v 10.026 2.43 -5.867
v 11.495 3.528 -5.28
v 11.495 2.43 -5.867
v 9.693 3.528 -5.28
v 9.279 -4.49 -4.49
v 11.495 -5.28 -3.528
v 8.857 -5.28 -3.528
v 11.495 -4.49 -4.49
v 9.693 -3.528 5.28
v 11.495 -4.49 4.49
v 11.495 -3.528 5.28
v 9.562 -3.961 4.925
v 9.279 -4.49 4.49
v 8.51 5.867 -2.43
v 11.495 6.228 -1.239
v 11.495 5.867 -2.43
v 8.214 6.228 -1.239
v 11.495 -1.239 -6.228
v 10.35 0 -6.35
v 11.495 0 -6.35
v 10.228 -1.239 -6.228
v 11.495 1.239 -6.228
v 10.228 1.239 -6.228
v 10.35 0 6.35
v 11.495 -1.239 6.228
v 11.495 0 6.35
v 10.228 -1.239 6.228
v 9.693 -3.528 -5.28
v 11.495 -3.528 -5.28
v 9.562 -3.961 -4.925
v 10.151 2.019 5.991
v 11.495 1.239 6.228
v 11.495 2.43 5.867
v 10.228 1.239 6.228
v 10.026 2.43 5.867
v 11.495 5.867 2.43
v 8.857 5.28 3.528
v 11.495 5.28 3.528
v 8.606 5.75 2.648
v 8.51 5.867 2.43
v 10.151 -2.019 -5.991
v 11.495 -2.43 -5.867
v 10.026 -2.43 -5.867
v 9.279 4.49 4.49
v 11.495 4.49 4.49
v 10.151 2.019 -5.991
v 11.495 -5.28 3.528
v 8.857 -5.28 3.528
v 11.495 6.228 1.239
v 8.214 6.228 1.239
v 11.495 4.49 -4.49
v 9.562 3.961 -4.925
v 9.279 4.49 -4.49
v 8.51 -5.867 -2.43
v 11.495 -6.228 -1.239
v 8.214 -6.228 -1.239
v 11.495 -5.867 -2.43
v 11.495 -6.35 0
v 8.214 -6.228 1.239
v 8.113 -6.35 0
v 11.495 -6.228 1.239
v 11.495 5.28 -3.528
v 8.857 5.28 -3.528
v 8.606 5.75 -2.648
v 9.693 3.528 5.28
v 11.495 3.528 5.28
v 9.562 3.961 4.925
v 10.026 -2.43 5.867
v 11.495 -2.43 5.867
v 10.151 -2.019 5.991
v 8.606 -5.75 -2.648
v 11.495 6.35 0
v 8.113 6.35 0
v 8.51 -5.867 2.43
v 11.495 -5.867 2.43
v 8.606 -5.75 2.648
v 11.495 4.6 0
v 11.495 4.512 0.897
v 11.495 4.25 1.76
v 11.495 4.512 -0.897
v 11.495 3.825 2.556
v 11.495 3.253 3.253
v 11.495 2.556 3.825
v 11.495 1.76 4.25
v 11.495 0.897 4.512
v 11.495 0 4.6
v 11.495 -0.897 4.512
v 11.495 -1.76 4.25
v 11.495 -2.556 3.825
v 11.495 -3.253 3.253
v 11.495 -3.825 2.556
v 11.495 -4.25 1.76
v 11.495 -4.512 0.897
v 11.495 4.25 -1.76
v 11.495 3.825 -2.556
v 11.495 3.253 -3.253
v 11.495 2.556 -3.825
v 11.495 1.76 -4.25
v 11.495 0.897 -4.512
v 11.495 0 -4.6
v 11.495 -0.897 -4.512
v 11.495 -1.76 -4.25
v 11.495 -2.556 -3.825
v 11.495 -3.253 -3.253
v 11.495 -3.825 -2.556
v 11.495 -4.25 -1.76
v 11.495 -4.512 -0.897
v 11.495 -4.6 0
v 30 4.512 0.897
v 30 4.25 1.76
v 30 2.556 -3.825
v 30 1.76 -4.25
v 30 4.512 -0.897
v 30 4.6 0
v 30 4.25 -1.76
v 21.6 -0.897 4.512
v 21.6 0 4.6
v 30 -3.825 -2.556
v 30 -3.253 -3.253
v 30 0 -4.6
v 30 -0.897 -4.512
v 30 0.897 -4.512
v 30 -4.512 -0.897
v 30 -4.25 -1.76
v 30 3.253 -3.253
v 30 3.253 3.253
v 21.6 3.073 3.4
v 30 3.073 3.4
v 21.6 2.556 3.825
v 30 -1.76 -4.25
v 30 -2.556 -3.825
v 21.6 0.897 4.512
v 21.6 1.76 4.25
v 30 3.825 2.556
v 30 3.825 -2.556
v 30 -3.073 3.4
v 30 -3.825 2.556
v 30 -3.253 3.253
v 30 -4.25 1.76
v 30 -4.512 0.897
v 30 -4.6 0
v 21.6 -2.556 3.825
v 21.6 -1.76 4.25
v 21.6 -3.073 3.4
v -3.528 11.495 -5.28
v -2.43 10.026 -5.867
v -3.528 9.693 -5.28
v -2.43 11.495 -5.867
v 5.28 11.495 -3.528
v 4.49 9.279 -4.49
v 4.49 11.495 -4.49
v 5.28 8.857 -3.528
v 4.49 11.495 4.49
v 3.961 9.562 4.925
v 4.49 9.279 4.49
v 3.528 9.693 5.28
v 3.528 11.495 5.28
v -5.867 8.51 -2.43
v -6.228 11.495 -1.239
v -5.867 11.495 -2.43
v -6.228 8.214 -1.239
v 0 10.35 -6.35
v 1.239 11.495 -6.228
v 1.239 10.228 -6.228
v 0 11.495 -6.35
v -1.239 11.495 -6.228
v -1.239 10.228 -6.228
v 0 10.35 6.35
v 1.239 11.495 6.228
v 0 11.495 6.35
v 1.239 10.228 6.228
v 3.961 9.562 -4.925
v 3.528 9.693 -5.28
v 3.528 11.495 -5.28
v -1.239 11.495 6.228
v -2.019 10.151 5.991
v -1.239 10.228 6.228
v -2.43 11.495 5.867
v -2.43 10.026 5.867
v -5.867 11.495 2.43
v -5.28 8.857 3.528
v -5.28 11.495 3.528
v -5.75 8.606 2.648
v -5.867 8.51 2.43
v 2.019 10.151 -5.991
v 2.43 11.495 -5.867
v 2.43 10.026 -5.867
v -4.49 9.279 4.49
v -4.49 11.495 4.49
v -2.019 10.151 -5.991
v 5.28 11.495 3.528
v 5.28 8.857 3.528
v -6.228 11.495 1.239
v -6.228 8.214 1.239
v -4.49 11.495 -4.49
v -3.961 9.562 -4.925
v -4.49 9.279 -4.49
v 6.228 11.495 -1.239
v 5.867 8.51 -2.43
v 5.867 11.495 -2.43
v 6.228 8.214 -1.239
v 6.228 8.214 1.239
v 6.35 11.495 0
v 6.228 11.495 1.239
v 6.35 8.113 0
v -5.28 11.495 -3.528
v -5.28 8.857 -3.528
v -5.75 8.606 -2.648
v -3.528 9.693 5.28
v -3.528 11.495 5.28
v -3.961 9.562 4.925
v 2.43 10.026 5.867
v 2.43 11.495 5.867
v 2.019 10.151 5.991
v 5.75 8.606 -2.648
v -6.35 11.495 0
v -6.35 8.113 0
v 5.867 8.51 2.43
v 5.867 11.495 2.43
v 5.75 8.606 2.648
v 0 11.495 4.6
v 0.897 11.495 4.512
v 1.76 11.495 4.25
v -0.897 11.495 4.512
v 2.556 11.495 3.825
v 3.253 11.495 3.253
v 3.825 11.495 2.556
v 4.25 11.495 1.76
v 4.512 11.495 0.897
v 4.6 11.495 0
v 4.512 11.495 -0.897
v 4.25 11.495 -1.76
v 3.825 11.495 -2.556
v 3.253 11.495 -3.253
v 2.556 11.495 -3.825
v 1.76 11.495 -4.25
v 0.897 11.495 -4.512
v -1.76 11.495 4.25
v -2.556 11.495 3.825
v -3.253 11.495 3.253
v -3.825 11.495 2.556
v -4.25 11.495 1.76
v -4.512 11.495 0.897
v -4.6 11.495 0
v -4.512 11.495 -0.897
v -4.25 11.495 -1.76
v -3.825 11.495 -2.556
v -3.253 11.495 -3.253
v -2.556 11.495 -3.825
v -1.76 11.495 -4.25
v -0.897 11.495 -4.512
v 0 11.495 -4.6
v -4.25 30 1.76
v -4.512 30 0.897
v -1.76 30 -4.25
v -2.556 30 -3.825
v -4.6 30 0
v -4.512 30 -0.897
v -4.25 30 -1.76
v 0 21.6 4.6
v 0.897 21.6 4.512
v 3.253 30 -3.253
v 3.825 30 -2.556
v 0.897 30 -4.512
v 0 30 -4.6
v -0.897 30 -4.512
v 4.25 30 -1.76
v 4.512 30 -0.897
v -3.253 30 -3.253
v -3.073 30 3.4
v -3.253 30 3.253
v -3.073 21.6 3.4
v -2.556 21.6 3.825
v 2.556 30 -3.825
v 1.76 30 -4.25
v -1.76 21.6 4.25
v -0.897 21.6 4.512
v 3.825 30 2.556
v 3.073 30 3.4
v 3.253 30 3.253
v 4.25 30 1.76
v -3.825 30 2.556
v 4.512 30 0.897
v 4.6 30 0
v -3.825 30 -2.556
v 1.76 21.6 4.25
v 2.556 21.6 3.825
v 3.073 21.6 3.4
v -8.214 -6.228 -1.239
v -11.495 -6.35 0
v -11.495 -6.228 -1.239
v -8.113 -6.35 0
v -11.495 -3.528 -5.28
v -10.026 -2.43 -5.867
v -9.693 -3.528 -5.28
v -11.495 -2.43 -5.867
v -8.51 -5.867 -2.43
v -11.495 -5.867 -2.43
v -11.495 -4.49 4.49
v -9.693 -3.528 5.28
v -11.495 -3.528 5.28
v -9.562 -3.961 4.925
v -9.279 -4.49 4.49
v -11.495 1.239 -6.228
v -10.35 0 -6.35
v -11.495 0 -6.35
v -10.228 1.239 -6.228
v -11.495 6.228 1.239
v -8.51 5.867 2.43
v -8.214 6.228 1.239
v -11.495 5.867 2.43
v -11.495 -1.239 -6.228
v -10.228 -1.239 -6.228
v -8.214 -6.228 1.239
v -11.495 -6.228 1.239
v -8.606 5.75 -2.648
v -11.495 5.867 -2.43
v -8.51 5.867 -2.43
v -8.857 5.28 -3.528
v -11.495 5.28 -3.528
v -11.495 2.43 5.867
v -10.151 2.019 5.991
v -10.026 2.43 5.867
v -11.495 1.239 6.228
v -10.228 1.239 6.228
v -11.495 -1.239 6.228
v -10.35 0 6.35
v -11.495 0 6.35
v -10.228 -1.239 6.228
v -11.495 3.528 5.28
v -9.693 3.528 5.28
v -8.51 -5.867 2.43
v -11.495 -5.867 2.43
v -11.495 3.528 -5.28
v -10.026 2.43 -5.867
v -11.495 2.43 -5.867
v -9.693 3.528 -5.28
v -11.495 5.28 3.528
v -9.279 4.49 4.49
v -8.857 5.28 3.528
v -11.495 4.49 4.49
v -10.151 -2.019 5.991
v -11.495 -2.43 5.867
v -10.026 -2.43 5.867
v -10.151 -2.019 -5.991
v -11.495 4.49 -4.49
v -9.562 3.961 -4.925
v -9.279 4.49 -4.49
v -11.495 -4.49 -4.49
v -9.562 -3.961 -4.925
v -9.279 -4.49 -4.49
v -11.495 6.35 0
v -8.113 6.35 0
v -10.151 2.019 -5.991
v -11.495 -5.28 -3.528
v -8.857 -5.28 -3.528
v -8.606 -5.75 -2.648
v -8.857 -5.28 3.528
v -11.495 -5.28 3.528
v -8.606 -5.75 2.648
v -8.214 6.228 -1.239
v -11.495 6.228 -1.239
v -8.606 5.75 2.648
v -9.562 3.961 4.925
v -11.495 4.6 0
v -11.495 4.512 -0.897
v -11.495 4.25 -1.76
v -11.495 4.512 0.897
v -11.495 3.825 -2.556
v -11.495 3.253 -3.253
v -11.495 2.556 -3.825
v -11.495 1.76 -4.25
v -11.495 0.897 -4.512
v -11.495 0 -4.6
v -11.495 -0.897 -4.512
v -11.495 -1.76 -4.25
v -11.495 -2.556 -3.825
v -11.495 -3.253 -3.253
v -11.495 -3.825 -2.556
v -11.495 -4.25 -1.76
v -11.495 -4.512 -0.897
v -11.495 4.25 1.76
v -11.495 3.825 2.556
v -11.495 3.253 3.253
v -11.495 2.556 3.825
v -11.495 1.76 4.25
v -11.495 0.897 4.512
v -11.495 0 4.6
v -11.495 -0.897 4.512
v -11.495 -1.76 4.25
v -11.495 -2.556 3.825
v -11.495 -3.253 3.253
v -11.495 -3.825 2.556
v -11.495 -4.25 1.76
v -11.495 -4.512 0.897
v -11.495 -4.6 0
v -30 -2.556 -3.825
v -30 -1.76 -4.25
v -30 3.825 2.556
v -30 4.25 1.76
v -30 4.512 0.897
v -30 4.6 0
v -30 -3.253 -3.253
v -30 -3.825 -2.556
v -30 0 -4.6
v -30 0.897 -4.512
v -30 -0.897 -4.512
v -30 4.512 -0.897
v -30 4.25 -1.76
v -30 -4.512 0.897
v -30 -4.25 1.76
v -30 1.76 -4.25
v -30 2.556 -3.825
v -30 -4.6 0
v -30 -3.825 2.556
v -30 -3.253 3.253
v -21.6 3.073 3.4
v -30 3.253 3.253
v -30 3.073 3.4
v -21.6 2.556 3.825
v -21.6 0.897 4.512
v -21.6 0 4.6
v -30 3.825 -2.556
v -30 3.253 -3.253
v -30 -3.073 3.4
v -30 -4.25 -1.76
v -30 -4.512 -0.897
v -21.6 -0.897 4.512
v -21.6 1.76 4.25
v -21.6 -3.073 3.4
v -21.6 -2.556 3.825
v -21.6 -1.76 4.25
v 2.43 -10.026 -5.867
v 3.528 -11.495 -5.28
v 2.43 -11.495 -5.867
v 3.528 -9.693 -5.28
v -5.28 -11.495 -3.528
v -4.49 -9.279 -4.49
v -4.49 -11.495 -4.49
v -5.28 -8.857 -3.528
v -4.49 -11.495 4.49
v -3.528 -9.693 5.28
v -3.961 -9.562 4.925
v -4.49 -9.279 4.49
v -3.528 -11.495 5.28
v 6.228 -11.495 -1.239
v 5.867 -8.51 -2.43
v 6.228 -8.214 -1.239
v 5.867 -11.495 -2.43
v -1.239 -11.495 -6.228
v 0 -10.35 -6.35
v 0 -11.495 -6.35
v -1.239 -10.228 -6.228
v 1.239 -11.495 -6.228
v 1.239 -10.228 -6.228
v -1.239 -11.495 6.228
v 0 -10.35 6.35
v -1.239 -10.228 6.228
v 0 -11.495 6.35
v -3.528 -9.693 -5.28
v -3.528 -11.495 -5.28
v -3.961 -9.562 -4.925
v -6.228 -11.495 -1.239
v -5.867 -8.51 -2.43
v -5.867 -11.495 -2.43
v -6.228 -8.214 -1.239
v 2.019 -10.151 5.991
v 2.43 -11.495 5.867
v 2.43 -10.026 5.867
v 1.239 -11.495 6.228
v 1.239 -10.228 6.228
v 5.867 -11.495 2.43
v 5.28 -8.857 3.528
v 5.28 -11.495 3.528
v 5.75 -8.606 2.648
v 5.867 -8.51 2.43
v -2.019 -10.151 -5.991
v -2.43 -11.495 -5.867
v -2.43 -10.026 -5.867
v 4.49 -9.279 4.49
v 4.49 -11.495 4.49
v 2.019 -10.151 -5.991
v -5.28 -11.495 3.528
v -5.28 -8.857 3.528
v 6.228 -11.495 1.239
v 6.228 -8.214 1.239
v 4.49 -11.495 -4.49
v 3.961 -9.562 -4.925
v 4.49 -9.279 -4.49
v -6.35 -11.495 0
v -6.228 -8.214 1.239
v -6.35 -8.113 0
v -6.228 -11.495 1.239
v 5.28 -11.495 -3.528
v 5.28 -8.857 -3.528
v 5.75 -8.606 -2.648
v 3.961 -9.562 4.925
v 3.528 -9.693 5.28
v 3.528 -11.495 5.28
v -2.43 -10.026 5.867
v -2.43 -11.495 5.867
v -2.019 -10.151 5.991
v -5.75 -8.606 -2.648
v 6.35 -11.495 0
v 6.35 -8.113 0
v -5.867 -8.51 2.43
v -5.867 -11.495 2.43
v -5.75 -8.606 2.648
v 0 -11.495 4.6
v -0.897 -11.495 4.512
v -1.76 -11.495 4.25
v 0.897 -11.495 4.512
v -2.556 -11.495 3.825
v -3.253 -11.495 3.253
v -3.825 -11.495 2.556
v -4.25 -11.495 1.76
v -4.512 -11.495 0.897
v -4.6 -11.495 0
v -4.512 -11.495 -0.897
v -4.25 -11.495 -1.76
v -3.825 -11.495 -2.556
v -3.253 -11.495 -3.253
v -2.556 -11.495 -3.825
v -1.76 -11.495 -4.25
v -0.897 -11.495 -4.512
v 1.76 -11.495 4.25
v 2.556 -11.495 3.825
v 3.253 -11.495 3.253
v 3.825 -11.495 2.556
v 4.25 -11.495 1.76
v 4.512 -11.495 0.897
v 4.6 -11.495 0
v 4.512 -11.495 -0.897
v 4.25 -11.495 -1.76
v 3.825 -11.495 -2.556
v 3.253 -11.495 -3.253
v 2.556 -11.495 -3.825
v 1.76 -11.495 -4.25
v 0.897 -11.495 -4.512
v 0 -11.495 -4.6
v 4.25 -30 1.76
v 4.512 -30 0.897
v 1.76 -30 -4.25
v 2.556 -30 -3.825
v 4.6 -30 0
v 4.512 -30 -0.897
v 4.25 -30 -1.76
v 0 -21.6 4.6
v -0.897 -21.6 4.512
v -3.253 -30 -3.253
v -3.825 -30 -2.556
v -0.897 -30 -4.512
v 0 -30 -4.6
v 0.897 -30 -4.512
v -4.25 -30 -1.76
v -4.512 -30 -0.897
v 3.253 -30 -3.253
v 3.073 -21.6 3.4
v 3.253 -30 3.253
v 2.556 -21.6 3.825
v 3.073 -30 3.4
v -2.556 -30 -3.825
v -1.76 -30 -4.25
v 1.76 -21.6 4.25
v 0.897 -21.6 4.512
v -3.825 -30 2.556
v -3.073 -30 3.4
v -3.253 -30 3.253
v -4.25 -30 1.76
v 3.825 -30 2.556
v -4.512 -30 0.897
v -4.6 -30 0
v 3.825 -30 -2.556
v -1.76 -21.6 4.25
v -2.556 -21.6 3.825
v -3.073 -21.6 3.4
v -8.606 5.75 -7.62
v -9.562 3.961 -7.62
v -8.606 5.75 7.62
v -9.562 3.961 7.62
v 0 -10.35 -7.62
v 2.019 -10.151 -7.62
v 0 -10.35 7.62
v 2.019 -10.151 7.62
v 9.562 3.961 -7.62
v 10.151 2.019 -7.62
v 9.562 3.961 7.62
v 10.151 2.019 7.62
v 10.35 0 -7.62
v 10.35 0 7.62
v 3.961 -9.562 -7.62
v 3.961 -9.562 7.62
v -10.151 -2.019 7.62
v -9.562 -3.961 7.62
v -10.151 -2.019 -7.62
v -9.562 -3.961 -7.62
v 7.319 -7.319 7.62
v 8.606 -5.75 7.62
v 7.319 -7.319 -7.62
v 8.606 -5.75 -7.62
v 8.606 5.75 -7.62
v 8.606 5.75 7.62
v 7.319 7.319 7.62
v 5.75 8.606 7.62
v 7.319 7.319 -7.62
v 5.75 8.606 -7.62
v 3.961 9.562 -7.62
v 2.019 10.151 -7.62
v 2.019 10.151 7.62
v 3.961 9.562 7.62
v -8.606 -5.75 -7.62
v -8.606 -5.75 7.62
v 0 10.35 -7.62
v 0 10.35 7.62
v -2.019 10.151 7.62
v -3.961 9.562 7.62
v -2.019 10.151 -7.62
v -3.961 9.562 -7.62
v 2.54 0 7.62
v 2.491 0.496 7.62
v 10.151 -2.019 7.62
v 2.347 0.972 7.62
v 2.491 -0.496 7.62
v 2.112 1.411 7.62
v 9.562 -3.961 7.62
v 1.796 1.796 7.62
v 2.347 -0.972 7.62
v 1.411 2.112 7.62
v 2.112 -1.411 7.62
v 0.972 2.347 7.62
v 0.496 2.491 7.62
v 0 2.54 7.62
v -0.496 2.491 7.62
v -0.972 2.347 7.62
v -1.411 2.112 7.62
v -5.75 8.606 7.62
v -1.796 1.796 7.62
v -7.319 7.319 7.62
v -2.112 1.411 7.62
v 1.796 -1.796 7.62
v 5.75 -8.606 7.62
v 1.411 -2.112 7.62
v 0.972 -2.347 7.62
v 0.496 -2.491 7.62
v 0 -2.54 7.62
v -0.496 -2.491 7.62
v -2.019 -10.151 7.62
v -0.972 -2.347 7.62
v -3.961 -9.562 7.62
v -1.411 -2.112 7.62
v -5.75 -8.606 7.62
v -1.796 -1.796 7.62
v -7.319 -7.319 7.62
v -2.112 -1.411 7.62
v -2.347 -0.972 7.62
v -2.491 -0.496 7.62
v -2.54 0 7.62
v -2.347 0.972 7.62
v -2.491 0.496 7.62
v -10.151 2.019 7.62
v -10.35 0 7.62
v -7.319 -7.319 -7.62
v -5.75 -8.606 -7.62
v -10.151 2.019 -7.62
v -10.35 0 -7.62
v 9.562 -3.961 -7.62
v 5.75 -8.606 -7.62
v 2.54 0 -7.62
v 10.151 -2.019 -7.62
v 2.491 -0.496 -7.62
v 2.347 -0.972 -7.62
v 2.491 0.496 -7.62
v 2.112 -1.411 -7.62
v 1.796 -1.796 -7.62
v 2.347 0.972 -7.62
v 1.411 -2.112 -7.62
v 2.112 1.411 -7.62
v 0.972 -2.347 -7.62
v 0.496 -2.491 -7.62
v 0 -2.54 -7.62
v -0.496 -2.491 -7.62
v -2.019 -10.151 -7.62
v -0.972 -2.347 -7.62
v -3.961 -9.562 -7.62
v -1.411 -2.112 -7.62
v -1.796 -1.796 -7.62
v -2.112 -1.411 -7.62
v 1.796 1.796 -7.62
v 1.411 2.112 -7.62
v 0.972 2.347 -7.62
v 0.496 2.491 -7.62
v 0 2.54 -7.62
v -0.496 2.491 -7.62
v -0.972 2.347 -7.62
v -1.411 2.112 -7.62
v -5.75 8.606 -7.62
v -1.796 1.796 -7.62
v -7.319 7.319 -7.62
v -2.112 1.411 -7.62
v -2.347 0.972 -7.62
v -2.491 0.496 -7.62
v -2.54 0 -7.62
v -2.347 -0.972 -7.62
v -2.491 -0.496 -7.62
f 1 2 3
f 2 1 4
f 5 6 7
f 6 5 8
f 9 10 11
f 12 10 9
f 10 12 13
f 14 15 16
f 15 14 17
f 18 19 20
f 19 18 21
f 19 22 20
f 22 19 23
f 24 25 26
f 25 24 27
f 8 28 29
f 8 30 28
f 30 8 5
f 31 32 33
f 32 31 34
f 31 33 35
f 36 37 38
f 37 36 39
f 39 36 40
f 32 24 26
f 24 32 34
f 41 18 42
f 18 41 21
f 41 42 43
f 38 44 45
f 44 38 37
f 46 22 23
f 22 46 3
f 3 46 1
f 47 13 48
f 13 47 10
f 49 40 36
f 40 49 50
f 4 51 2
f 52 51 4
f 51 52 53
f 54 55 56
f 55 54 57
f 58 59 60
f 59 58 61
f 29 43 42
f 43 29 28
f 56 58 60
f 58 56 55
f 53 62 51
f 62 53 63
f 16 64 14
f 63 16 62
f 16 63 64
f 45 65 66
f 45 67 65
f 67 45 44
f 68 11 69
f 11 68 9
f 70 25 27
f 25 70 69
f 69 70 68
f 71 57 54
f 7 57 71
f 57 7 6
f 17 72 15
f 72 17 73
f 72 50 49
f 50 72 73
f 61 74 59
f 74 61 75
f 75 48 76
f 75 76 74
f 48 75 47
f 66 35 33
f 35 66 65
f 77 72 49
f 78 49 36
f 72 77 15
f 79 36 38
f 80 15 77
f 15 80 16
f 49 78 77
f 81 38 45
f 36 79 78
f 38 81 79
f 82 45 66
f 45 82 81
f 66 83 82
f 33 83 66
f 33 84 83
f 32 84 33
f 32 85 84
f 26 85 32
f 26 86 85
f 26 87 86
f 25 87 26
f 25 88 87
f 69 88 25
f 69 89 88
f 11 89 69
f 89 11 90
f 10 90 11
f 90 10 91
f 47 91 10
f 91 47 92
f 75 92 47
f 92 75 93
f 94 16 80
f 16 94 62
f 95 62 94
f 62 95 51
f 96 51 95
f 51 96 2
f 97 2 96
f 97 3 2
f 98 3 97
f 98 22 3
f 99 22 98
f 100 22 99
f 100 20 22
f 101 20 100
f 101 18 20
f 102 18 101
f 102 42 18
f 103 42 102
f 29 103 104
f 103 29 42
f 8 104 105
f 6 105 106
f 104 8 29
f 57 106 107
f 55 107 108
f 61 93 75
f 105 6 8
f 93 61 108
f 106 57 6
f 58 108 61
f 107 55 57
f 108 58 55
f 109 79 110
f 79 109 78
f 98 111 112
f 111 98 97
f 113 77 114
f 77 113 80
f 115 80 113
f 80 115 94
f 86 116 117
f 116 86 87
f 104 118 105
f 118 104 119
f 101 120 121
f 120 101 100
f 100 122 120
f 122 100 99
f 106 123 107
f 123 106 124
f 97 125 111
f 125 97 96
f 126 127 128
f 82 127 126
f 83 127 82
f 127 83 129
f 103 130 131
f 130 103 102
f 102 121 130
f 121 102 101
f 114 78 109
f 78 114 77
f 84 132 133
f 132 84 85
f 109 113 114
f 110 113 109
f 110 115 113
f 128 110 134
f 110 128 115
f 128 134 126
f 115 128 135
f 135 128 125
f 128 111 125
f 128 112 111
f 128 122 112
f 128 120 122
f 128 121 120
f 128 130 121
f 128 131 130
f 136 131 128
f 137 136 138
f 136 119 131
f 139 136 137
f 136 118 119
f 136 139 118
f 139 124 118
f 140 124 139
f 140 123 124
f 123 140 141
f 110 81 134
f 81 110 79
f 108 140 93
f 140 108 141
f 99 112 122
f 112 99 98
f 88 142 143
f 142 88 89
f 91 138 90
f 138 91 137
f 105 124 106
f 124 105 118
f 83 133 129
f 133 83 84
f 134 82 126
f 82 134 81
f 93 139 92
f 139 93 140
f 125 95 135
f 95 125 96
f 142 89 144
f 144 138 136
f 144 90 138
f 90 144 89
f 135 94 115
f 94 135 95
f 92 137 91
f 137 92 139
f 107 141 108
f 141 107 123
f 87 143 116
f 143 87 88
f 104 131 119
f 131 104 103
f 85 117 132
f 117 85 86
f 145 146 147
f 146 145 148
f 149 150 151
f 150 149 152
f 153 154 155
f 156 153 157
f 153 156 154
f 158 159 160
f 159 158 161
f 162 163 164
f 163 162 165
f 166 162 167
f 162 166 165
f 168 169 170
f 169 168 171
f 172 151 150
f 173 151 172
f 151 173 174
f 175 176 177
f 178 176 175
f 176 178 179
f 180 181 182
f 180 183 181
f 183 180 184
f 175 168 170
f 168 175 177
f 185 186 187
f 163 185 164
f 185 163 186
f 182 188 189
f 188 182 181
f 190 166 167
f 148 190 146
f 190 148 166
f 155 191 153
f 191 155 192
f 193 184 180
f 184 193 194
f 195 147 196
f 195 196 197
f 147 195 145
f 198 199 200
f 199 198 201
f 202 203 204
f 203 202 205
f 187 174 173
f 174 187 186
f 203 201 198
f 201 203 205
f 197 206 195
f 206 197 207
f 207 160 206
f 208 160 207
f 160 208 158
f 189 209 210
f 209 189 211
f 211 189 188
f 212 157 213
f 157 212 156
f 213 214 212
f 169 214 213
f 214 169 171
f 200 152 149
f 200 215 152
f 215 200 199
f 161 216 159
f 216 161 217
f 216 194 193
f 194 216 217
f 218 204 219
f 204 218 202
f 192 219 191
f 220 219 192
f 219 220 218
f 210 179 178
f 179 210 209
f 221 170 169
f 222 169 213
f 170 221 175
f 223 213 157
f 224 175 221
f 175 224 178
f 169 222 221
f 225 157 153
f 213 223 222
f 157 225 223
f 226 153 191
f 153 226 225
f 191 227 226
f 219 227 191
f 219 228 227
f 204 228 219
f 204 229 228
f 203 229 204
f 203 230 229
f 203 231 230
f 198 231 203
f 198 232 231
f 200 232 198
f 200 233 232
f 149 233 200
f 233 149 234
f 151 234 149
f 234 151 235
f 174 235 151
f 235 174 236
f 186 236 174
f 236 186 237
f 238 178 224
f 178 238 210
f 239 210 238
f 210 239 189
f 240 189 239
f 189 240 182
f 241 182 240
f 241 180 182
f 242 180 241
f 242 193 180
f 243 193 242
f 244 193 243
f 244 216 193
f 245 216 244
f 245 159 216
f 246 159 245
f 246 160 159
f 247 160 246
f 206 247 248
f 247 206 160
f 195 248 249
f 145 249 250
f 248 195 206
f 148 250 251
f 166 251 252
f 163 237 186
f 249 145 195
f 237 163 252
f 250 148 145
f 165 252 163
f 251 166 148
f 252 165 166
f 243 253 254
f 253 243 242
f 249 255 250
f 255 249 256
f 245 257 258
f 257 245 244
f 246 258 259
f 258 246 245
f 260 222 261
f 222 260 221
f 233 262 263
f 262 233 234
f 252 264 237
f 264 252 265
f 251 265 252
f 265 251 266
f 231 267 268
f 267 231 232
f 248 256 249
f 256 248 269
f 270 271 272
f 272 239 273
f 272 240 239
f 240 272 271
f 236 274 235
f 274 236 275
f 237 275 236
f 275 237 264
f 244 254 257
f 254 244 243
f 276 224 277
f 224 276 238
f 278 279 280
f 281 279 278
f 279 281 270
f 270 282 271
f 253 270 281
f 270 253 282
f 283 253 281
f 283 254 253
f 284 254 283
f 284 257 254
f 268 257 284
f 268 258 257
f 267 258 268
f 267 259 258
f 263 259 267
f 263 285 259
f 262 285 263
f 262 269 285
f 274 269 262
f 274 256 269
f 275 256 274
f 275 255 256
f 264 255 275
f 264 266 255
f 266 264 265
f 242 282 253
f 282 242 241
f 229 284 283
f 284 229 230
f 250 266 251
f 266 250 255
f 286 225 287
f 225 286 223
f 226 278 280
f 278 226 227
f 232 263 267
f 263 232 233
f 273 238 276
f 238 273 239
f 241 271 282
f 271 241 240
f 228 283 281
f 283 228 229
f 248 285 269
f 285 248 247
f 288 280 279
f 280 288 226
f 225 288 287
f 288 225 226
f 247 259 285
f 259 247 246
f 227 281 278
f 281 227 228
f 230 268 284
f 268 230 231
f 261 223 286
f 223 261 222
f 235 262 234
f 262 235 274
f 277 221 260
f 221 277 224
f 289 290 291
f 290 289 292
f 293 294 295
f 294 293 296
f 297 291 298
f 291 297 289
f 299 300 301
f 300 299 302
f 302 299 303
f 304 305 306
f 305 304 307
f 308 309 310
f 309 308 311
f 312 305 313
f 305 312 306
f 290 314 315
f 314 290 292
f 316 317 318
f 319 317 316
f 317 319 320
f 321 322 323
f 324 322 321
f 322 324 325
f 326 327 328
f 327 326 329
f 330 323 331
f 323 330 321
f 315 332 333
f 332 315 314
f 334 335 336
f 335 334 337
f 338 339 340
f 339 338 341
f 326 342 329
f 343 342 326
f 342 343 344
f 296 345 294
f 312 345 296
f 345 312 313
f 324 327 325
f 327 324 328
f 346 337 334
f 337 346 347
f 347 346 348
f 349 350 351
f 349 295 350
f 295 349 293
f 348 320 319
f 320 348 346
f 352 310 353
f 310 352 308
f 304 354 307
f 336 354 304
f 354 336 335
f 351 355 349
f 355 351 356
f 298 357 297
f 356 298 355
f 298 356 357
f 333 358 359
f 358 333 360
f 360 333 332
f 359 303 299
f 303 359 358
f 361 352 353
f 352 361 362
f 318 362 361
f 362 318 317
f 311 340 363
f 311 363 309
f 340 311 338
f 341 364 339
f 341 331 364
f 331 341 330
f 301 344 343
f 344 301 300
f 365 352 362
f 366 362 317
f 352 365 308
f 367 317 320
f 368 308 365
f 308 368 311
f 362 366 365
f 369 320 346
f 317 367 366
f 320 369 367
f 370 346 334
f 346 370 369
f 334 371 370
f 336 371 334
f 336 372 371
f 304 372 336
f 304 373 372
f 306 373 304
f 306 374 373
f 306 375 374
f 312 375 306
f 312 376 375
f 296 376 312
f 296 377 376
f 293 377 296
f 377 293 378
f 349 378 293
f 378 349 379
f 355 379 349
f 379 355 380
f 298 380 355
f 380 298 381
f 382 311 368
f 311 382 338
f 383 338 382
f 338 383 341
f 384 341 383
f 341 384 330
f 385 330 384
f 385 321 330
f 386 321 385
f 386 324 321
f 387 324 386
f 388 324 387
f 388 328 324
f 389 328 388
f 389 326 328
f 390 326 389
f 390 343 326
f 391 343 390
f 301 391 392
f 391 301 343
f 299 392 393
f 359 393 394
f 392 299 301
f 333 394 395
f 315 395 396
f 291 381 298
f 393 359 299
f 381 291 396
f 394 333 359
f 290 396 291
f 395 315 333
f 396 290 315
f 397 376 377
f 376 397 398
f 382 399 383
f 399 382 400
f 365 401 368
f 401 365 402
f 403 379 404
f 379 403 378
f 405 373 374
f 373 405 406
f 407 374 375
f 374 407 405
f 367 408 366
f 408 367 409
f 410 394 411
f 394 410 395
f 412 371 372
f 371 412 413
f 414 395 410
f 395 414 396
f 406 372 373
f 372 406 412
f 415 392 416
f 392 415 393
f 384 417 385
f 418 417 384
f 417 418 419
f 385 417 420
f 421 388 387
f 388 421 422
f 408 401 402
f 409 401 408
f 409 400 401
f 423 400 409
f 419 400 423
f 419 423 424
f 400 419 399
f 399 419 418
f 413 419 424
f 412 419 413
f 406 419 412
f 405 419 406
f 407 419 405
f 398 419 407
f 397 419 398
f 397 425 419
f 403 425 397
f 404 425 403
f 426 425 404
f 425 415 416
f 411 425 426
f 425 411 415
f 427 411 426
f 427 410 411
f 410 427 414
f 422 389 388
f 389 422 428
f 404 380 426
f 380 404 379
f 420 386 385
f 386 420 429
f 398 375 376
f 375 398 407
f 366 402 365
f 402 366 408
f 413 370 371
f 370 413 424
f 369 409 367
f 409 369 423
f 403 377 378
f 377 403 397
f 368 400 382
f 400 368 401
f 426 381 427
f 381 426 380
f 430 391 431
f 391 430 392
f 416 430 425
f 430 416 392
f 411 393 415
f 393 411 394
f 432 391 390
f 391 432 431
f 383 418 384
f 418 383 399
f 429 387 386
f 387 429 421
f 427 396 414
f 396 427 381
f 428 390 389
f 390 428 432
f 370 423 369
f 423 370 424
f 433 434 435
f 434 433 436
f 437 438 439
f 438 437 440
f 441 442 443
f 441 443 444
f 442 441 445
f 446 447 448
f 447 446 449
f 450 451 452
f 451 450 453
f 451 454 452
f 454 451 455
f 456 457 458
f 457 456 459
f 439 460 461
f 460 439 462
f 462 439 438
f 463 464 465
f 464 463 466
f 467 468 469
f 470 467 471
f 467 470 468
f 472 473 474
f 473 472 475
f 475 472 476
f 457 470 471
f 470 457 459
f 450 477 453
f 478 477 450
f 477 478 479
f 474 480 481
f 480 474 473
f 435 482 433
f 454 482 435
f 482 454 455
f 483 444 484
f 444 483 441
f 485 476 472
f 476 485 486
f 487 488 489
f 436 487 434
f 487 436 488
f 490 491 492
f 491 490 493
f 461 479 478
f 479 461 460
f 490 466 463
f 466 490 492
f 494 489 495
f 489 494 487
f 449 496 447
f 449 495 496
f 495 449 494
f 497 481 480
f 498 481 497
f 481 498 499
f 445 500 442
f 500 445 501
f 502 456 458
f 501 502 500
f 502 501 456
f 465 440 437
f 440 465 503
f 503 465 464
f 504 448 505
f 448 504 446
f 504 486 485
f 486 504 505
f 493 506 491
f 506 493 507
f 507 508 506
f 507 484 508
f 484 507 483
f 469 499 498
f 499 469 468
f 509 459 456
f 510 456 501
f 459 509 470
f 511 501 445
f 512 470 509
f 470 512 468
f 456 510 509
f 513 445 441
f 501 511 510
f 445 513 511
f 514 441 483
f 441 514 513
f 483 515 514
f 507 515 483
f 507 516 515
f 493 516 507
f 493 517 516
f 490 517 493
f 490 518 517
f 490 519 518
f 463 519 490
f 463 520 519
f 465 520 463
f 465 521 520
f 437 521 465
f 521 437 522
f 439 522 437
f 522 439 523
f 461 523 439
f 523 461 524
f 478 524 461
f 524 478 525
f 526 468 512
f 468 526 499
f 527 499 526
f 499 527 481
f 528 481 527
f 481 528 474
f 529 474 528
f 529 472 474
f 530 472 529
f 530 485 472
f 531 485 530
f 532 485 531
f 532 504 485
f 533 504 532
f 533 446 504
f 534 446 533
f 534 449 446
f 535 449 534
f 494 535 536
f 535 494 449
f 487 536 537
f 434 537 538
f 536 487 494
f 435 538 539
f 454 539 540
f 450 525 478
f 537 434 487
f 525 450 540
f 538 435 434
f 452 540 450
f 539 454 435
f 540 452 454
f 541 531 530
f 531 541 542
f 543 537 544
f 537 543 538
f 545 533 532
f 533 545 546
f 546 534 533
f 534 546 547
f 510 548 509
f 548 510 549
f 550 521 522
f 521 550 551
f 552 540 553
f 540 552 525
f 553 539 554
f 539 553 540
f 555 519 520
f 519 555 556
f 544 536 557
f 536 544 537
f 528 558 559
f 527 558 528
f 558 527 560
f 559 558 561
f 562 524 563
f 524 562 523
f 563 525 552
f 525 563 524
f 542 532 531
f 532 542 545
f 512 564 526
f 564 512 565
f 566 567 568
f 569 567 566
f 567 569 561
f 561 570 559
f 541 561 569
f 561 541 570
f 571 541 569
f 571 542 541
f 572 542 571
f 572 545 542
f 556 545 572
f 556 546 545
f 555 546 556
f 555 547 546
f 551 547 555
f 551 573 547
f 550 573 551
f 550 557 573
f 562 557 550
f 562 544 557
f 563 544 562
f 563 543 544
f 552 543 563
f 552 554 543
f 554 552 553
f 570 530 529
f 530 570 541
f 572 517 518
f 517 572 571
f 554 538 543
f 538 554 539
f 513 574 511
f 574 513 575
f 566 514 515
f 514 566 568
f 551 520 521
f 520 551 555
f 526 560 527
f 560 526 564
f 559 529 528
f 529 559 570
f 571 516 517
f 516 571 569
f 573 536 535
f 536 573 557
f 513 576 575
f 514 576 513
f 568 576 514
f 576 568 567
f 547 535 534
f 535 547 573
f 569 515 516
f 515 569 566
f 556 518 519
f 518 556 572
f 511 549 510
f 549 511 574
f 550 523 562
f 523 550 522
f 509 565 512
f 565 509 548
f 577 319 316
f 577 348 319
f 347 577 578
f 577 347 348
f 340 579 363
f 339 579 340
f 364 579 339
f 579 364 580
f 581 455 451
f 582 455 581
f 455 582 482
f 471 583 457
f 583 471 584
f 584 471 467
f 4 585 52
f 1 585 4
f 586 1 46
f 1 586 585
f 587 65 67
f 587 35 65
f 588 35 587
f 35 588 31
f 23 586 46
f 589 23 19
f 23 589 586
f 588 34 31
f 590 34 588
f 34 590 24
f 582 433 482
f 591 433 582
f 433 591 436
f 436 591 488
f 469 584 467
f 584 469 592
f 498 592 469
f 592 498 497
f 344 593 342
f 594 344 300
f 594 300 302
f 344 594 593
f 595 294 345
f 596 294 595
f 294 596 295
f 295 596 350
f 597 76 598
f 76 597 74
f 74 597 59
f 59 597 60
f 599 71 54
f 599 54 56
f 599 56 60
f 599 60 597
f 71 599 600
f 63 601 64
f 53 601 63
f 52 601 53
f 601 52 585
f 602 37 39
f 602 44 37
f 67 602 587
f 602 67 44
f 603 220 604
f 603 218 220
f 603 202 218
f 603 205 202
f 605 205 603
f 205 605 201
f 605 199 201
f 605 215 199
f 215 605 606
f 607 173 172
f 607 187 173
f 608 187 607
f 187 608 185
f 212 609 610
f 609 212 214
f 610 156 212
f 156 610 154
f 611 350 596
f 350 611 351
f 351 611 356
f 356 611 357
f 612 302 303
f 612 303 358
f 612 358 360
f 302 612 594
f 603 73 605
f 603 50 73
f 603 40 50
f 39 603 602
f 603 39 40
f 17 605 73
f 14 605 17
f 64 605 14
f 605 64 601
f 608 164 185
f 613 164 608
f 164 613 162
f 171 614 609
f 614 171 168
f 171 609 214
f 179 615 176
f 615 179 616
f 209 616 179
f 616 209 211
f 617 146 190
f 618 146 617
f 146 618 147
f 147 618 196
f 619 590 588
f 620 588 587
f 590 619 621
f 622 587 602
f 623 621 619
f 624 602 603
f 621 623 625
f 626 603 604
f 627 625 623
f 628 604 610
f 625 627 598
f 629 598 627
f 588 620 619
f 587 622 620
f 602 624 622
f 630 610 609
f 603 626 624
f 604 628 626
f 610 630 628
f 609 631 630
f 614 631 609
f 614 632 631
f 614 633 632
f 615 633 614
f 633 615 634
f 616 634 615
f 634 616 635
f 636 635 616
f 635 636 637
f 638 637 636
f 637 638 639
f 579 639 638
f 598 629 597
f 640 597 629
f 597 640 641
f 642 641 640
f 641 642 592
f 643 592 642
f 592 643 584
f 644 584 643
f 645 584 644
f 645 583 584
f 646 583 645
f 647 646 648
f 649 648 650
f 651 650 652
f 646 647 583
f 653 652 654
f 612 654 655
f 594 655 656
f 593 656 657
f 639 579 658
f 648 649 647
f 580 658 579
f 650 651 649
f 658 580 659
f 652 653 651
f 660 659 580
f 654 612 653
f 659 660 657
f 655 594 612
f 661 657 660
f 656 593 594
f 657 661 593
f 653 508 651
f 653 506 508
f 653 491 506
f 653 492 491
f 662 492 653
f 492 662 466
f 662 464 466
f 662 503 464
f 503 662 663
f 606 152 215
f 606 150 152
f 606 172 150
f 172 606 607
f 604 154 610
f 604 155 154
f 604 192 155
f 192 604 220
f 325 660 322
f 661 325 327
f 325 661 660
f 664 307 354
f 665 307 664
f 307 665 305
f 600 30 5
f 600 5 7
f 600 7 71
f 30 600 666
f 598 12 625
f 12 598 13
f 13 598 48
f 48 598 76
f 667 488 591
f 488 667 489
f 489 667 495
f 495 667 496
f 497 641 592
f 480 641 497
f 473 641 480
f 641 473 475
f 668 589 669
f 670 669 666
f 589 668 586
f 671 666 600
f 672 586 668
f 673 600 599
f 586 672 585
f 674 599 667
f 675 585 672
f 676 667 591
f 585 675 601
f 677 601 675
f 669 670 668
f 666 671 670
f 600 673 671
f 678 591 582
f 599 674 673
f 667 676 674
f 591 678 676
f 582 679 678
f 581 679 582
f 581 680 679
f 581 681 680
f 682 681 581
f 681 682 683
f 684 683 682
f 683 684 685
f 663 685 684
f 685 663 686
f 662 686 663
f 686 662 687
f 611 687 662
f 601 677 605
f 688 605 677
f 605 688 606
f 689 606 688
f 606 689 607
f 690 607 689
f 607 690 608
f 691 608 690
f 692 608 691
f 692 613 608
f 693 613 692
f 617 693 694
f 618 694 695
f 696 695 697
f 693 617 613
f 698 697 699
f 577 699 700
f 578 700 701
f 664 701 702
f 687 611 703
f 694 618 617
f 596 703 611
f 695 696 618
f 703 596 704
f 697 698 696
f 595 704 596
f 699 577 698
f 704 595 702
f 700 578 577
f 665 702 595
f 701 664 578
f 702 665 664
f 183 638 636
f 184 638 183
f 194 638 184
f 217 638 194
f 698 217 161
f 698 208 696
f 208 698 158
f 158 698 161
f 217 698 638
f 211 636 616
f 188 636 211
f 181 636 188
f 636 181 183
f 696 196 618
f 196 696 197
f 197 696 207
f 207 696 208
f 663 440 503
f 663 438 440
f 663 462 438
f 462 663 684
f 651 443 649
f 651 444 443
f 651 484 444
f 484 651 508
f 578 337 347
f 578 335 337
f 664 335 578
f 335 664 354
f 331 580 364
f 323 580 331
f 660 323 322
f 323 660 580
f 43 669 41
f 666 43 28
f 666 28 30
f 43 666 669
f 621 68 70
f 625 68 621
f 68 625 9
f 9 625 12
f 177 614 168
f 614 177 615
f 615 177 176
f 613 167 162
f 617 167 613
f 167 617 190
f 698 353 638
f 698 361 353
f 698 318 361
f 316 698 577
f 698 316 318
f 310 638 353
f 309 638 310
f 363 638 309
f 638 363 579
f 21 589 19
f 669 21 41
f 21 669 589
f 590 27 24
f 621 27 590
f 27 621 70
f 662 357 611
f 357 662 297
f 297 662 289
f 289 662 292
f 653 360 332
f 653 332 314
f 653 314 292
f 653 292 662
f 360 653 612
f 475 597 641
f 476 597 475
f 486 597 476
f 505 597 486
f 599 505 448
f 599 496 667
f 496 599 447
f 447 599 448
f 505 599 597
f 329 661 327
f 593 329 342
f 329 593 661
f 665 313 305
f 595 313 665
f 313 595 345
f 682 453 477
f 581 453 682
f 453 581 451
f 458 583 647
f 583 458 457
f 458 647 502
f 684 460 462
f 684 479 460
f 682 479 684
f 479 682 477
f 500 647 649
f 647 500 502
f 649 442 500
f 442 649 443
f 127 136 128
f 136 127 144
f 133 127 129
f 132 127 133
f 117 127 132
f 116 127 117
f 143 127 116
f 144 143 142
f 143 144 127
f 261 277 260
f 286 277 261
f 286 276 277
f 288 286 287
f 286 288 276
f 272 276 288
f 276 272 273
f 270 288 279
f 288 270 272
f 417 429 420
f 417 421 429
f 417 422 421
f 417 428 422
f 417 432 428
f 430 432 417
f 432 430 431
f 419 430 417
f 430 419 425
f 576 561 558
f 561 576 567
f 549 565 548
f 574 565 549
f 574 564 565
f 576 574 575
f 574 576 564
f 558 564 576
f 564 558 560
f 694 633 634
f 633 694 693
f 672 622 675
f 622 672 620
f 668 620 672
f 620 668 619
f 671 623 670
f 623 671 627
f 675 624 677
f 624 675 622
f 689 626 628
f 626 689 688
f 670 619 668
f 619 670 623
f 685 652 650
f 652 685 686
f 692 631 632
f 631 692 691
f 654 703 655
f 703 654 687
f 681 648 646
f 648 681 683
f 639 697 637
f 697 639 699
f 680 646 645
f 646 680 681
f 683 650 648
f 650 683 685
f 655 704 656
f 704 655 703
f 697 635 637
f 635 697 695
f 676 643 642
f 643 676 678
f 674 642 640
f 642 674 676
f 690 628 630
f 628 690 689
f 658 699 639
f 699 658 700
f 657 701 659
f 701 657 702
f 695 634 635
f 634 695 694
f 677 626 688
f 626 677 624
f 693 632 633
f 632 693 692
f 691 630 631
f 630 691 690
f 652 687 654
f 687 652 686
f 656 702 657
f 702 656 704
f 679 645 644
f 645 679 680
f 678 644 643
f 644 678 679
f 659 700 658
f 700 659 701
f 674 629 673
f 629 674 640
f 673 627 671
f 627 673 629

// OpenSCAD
$fn = 32;

// ----------------------------------------------------------------------
// Cardan cross: 60 mm span, 12.7 mm trunnions
// ----------------------------------------------------------------------

// --- parameters (mm) ---
journal_d = 12.7;         // trunnion diameter
arm_len = 30;             // trunnion length from the centre
step_r = 4.32;            // step position from the centre
step_d = 9.2;             // journal diameter after the step
hub_d = 20.7;             // hub diameter
hub_h = 15.24;            // hub height
bore_d = 5.08;            // hub bore
flat_d = 1.2;             // depth of the journal flat
flat_len = 8.4;           // length of the journal flat

difference() {
  union() {
    /* hub along the joint axis */
    cylinder(h = hub_h, d = hub_d, center = true);
    for (a = [0 : 90 : 270]) rotate([0, 0, a]) {
      /* trunnion, sunk into the hub */
      translate([hub_d / 4, 0, 0]) rotate([0, 90, 0]) cylinder(h = step_r + 2, d = journal_d);
      /* stepped journal out to the tip */
      translate([step_r - 0.5, 0, 0]) rotate([0, 90, 0]) cylinder(h = arm_len + 0.5 - step_r, d = step_d);
    }
  }
  /* lubrication bore through the hub, 2.5 mm clear on both sides */
  translate([0, 0, -hub_h / 2 - 2.5]) cylinder(h = hub_h + 5, d = bore_d);
  /* machined flat on each journal tip */
  for (a = [0 : 90 : 270]) rotate([0, 0, a]) {
    translate([arm_len - flat_len, -step_d, step_d / 2 - flat_d]) cube([flat_len + 0.5, 2 * step_d, flat_d + 2.5]);
  }
}
